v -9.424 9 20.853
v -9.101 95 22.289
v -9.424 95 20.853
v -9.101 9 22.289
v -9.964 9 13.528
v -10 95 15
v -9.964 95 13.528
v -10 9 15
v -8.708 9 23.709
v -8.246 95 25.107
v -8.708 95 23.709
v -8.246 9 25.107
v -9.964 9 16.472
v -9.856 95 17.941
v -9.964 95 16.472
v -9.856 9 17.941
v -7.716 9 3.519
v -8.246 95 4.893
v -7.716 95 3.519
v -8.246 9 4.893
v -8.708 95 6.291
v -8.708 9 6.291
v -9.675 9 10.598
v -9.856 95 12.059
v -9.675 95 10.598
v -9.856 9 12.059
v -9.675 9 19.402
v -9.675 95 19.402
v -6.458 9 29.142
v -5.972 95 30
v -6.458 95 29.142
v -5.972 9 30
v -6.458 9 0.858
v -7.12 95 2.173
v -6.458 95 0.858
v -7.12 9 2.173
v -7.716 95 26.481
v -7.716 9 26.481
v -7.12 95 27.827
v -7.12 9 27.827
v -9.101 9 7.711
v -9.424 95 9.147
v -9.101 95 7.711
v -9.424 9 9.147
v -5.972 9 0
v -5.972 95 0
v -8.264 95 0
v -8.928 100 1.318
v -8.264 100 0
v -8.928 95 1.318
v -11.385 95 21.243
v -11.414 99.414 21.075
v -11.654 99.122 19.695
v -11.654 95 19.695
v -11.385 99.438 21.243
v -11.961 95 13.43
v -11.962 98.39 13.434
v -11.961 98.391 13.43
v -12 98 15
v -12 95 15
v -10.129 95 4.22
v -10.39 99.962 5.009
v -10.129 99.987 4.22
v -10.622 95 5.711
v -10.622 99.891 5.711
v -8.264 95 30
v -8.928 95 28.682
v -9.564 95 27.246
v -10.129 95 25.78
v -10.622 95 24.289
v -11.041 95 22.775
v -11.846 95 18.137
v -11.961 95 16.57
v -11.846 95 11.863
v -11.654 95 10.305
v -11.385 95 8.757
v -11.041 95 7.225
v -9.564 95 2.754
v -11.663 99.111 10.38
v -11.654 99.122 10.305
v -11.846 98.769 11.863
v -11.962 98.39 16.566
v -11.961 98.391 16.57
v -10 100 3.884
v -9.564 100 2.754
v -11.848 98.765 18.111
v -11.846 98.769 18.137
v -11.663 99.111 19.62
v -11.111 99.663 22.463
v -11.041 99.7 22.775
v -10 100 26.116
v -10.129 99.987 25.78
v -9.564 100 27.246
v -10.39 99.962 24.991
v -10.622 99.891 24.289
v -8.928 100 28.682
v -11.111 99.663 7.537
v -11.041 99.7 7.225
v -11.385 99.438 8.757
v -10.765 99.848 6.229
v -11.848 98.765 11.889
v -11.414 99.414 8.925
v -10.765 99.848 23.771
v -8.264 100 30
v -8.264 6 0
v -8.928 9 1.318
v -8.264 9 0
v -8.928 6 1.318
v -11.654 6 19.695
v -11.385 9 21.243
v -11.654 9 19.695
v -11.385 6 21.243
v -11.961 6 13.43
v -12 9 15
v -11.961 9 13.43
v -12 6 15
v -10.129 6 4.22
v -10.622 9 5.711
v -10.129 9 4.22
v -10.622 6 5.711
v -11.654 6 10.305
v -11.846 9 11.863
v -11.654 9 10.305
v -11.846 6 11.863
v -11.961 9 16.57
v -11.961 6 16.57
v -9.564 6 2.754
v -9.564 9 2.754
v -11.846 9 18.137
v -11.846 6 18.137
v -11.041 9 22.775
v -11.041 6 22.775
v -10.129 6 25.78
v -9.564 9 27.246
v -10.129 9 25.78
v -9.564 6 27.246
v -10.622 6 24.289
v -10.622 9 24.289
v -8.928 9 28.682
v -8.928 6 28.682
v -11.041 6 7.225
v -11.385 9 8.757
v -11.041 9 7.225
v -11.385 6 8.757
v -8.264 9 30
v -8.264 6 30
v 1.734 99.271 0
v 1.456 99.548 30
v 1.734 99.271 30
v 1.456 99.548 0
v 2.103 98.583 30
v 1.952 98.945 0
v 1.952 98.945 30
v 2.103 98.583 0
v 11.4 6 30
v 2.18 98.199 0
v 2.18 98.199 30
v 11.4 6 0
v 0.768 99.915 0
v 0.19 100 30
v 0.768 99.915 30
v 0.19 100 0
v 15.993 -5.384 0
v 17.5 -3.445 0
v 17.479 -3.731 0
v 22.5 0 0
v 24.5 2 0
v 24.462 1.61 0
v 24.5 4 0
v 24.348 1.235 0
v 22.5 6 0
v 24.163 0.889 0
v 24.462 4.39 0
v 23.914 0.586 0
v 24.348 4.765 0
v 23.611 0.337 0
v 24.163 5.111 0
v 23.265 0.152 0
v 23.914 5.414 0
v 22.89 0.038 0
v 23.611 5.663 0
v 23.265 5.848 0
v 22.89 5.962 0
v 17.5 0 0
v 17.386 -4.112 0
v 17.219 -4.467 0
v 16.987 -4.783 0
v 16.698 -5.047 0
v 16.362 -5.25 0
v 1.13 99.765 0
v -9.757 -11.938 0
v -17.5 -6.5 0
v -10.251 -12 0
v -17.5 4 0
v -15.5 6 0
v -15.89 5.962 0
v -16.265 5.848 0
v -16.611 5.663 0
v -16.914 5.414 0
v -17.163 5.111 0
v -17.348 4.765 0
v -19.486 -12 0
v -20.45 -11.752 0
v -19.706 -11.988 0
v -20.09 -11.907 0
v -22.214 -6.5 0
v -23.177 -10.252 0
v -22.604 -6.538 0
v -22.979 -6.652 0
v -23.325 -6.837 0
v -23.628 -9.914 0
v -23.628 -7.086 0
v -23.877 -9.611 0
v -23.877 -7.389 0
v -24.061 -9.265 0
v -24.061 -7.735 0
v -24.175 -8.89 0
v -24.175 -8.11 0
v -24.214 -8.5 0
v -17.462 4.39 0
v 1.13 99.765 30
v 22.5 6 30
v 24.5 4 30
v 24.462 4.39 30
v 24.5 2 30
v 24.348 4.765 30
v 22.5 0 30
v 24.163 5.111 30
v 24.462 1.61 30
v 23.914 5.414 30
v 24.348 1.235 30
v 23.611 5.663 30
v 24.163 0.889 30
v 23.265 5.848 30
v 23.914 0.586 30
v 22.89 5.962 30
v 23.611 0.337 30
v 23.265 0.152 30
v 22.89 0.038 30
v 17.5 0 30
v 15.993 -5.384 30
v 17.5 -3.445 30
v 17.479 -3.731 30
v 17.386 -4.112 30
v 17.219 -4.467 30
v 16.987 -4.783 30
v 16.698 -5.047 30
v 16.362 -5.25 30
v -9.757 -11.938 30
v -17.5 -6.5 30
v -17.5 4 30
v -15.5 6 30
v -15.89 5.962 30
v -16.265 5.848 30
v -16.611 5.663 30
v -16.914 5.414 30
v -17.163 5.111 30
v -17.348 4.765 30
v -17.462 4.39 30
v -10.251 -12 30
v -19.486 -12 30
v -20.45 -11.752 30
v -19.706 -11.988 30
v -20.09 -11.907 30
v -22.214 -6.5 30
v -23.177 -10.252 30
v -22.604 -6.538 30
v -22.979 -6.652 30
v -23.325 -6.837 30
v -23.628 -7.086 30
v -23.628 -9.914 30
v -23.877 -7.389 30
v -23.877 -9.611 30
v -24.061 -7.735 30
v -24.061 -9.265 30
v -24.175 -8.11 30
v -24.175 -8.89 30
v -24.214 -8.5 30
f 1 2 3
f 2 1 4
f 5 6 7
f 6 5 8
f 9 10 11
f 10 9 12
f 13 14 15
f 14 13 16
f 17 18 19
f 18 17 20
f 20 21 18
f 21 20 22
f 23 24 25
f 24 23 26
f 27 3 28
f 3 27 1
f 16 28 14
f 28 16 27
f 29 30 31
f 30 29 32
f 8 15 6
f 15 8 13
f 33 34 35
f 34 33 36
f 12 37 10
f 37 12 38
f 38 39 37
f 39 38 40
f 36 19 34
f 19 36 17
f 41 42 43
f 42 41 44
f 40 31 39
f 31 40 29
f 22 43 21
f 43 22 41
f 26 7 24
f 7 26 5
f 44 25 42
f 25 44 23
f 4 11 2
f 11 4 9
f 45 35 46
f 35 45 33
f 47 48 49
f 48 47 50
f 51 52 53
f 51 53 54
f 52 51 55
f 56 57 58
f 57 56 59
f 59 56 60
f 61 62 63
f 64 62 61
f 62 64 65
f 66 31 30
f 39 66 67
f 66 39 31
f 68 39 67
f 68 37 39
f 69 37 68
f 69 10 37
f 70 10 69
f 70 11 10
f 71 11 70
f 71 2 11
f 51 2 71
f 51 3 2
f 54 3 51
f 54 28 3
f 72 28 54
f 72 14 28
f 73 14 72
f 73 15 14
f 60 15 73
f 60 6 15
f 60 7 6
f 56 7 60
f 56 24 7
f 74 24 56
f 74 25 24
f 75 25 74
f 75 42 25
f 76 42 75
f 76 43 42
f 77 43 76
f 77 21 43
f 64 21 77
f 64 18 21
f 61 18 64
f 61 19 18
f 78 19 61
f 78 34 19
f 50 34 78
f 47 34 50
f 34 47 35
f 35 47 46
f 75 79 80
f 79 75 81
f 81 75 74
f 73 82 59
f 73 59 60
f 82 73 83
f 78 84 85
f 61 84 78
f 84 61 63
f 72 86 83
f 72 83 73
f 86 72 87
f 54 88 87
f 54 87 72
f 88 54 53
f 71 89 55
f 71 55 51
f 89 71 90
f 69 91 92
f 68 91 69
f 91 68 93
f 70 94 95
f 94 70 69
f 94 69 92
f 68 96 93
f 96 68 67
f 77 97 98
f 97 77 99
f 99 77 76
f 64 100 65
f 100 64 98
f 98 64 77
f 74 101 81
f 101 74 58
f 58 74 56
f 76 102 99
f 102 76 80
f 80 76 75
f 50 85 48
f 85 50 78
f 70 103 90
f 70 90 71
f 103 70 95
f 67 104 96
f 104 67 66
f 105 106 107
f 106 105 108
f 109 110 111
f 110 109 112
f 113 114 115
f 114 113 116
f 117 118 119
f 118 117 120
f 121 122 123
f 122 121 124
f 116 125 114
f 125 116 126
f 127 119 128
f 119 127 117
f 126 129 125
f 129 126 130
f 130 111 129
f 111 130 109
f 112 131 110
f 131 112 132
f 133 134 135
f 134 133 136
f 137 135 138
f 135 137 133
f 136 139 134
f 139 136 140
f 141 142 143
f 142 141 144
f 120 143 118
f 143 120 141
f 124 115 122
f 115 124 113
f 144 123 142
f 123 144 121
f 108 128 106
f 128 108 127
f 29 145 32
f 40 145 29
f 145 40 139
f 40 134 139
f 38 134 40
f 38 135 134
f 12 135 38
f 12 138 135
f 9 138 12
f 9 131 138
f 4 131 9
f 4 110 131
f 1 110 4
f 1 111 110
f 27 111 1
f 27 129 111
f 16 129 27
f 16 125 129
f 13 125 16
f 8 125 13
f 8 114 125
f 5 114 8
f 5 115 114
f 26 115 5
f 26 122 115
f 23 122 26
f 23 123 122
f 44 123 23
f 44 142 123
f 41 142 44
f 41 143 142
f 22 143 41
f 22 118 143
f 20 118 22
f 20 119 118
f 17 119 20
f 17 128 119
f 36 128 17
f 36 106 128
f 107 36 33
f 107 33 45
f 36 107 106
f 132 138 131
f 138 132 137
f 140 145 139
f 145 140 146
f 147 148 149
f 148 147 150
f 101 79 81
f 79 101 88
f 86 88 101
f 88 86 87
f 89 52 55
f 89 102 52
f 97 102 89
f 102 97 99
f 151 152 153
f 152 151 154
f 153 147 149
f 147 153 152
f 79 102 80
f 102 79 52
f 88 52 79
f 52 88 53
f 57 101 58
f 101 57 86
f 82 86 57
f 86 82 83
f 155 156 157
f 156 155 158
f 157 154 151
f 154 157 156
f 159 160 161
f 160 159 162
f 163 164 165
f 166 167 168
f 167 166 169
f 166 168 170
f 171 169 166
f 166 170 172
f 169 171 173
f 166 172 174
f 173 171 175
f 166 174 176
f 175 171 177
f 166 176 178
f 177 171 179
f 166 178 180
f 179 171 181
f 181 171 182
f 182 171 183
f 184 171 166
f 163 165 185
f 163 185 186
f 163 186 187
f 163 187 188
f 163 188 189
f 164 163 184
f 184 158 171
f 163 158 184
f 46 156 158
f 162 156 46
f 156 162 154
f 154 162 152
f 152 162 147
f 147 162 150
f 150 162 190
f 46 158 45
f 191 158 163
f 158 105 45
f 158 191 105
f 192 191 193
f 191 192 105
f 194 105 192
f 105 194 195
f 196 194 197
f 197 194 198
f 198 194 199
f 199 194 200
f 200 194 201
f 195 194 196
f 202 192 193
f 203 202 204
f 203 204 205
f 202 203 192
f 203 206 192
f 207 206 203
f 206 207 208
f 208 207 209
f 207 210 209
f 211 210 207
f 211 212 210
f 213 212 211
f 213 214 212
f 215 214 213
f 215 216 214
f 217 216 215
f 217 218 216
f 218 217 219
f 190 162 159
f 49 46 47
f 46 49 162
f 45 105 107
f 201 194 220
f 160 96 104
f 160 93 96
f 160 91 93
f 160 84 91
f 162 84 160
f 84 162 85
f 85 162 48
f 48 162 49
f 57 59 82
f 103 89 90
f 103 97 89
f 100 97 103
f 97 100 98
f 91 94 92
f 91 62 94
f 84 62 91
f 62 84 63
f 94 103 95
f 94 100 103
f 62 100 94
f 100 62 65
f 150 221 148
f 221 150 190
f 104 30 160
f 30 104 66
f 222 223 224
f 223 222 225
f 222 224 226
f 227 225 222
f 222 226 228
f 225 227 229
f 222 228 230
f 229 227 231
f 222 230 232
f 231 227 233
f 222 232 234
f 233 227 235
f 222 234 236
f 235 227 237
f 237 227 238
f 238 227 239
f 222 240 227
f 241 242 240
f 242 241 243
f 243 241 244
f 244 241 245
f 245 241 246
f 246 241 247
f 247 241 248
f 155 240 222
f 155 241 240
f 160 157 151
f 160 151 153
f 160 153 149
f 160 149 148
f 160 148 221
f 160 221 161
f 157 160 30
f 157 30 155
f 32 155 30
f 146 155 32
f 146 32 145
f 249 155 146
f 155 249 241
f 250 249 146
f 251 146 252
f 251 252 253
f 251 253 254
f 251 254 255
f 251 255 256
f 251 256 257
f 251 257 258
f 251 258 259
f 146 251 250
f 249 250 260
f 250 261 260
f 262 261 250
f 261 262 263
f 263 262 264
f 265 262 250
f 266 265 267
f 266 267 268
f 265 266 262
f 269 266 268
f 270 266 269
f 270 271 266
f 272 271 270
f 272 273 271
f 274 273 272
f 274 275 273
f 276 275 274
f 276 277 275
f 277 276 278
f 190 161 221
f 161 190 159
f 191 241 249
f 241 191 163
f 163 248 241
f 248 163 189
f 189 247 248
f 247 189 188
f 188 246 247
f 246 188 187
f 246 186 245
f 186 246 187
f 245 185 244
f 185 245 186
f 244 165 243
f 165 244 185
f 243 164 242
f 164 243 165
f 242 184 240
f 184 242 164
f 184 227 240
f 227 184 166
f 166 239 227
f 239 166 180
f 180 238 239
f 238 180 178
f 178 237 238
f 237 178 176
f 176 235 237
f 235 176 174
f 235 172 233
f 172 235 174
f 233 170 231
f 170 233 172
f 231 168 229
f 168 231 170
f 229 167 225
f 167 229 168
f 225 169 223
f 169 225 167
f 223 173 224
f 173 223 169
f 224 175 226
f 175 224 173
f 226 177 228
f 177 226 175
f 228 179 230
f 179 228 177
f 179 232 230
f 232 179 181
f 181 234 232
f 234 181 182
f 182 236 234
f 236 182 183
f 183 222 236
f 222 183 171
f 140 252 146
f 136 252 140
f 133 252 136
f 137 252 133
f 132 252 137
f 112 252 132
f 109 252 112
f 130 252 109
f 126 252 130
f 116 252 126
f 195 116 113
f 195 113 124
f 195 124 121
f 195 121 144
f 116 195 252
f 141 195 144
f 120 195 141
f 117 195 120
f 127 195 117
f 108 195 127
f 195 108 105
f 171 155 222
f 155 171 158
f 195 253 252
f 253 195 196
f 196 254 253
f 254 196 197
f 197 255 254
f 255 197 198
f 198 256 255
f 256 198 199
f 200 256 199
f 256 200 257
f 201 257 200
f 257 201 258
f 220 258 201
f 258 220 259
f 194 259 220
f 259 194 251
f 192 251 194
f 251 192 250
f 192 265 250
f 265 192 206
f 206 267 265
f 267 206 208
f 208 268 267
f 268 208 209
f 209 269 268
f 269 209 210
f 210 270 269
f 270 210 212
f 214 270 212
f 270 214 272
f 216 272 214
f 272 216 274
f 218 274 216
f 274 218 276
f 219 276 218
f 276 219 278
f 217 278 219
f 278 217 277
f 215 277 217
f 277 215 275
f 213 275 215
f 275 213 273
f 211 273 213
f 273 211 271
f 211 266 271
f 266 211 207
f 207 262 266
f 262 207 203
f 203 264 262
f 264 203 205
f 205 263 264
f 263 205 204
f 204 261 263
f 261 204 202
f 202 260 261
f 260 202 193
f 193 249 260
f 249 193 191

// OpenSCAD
w = 35;
w2 = 24;
h = 30;

linear_extrude(height=h)
offset(r=2,$fn=32) offset(delta=-2)
polygon(points=[
  [-20, -12], [-10,-12], [w/2,-5], [w/2, 0], [w/2+7,0], [w/2+7, 6], [-w/2, 6], [-w/2,-6.5], [-30,-6.5],
]);

intersection() {
  translate([-w2/2,0,0]) linear_extrude(height=h)
    offset(r=2,$fn=32) offset(delta=-2)
    polygon(points=[
      [0,0], [w2,0], [w*0.4,100], [0,100],
    ]);
  union() {
    translate([20,0,h/2]) rotate([-90,0,0]) cylinder(d=60,h=120,$fn=128);
    translate([20,95,h/2]) rotate([-90,0,0]) cylinder(d=60+4,h=120,$fn=128);
    translate([20,-1,h/2]) rotate([-90,0,0]) cylinder(d=60+4,h=10,$fn=128);
  }
}
